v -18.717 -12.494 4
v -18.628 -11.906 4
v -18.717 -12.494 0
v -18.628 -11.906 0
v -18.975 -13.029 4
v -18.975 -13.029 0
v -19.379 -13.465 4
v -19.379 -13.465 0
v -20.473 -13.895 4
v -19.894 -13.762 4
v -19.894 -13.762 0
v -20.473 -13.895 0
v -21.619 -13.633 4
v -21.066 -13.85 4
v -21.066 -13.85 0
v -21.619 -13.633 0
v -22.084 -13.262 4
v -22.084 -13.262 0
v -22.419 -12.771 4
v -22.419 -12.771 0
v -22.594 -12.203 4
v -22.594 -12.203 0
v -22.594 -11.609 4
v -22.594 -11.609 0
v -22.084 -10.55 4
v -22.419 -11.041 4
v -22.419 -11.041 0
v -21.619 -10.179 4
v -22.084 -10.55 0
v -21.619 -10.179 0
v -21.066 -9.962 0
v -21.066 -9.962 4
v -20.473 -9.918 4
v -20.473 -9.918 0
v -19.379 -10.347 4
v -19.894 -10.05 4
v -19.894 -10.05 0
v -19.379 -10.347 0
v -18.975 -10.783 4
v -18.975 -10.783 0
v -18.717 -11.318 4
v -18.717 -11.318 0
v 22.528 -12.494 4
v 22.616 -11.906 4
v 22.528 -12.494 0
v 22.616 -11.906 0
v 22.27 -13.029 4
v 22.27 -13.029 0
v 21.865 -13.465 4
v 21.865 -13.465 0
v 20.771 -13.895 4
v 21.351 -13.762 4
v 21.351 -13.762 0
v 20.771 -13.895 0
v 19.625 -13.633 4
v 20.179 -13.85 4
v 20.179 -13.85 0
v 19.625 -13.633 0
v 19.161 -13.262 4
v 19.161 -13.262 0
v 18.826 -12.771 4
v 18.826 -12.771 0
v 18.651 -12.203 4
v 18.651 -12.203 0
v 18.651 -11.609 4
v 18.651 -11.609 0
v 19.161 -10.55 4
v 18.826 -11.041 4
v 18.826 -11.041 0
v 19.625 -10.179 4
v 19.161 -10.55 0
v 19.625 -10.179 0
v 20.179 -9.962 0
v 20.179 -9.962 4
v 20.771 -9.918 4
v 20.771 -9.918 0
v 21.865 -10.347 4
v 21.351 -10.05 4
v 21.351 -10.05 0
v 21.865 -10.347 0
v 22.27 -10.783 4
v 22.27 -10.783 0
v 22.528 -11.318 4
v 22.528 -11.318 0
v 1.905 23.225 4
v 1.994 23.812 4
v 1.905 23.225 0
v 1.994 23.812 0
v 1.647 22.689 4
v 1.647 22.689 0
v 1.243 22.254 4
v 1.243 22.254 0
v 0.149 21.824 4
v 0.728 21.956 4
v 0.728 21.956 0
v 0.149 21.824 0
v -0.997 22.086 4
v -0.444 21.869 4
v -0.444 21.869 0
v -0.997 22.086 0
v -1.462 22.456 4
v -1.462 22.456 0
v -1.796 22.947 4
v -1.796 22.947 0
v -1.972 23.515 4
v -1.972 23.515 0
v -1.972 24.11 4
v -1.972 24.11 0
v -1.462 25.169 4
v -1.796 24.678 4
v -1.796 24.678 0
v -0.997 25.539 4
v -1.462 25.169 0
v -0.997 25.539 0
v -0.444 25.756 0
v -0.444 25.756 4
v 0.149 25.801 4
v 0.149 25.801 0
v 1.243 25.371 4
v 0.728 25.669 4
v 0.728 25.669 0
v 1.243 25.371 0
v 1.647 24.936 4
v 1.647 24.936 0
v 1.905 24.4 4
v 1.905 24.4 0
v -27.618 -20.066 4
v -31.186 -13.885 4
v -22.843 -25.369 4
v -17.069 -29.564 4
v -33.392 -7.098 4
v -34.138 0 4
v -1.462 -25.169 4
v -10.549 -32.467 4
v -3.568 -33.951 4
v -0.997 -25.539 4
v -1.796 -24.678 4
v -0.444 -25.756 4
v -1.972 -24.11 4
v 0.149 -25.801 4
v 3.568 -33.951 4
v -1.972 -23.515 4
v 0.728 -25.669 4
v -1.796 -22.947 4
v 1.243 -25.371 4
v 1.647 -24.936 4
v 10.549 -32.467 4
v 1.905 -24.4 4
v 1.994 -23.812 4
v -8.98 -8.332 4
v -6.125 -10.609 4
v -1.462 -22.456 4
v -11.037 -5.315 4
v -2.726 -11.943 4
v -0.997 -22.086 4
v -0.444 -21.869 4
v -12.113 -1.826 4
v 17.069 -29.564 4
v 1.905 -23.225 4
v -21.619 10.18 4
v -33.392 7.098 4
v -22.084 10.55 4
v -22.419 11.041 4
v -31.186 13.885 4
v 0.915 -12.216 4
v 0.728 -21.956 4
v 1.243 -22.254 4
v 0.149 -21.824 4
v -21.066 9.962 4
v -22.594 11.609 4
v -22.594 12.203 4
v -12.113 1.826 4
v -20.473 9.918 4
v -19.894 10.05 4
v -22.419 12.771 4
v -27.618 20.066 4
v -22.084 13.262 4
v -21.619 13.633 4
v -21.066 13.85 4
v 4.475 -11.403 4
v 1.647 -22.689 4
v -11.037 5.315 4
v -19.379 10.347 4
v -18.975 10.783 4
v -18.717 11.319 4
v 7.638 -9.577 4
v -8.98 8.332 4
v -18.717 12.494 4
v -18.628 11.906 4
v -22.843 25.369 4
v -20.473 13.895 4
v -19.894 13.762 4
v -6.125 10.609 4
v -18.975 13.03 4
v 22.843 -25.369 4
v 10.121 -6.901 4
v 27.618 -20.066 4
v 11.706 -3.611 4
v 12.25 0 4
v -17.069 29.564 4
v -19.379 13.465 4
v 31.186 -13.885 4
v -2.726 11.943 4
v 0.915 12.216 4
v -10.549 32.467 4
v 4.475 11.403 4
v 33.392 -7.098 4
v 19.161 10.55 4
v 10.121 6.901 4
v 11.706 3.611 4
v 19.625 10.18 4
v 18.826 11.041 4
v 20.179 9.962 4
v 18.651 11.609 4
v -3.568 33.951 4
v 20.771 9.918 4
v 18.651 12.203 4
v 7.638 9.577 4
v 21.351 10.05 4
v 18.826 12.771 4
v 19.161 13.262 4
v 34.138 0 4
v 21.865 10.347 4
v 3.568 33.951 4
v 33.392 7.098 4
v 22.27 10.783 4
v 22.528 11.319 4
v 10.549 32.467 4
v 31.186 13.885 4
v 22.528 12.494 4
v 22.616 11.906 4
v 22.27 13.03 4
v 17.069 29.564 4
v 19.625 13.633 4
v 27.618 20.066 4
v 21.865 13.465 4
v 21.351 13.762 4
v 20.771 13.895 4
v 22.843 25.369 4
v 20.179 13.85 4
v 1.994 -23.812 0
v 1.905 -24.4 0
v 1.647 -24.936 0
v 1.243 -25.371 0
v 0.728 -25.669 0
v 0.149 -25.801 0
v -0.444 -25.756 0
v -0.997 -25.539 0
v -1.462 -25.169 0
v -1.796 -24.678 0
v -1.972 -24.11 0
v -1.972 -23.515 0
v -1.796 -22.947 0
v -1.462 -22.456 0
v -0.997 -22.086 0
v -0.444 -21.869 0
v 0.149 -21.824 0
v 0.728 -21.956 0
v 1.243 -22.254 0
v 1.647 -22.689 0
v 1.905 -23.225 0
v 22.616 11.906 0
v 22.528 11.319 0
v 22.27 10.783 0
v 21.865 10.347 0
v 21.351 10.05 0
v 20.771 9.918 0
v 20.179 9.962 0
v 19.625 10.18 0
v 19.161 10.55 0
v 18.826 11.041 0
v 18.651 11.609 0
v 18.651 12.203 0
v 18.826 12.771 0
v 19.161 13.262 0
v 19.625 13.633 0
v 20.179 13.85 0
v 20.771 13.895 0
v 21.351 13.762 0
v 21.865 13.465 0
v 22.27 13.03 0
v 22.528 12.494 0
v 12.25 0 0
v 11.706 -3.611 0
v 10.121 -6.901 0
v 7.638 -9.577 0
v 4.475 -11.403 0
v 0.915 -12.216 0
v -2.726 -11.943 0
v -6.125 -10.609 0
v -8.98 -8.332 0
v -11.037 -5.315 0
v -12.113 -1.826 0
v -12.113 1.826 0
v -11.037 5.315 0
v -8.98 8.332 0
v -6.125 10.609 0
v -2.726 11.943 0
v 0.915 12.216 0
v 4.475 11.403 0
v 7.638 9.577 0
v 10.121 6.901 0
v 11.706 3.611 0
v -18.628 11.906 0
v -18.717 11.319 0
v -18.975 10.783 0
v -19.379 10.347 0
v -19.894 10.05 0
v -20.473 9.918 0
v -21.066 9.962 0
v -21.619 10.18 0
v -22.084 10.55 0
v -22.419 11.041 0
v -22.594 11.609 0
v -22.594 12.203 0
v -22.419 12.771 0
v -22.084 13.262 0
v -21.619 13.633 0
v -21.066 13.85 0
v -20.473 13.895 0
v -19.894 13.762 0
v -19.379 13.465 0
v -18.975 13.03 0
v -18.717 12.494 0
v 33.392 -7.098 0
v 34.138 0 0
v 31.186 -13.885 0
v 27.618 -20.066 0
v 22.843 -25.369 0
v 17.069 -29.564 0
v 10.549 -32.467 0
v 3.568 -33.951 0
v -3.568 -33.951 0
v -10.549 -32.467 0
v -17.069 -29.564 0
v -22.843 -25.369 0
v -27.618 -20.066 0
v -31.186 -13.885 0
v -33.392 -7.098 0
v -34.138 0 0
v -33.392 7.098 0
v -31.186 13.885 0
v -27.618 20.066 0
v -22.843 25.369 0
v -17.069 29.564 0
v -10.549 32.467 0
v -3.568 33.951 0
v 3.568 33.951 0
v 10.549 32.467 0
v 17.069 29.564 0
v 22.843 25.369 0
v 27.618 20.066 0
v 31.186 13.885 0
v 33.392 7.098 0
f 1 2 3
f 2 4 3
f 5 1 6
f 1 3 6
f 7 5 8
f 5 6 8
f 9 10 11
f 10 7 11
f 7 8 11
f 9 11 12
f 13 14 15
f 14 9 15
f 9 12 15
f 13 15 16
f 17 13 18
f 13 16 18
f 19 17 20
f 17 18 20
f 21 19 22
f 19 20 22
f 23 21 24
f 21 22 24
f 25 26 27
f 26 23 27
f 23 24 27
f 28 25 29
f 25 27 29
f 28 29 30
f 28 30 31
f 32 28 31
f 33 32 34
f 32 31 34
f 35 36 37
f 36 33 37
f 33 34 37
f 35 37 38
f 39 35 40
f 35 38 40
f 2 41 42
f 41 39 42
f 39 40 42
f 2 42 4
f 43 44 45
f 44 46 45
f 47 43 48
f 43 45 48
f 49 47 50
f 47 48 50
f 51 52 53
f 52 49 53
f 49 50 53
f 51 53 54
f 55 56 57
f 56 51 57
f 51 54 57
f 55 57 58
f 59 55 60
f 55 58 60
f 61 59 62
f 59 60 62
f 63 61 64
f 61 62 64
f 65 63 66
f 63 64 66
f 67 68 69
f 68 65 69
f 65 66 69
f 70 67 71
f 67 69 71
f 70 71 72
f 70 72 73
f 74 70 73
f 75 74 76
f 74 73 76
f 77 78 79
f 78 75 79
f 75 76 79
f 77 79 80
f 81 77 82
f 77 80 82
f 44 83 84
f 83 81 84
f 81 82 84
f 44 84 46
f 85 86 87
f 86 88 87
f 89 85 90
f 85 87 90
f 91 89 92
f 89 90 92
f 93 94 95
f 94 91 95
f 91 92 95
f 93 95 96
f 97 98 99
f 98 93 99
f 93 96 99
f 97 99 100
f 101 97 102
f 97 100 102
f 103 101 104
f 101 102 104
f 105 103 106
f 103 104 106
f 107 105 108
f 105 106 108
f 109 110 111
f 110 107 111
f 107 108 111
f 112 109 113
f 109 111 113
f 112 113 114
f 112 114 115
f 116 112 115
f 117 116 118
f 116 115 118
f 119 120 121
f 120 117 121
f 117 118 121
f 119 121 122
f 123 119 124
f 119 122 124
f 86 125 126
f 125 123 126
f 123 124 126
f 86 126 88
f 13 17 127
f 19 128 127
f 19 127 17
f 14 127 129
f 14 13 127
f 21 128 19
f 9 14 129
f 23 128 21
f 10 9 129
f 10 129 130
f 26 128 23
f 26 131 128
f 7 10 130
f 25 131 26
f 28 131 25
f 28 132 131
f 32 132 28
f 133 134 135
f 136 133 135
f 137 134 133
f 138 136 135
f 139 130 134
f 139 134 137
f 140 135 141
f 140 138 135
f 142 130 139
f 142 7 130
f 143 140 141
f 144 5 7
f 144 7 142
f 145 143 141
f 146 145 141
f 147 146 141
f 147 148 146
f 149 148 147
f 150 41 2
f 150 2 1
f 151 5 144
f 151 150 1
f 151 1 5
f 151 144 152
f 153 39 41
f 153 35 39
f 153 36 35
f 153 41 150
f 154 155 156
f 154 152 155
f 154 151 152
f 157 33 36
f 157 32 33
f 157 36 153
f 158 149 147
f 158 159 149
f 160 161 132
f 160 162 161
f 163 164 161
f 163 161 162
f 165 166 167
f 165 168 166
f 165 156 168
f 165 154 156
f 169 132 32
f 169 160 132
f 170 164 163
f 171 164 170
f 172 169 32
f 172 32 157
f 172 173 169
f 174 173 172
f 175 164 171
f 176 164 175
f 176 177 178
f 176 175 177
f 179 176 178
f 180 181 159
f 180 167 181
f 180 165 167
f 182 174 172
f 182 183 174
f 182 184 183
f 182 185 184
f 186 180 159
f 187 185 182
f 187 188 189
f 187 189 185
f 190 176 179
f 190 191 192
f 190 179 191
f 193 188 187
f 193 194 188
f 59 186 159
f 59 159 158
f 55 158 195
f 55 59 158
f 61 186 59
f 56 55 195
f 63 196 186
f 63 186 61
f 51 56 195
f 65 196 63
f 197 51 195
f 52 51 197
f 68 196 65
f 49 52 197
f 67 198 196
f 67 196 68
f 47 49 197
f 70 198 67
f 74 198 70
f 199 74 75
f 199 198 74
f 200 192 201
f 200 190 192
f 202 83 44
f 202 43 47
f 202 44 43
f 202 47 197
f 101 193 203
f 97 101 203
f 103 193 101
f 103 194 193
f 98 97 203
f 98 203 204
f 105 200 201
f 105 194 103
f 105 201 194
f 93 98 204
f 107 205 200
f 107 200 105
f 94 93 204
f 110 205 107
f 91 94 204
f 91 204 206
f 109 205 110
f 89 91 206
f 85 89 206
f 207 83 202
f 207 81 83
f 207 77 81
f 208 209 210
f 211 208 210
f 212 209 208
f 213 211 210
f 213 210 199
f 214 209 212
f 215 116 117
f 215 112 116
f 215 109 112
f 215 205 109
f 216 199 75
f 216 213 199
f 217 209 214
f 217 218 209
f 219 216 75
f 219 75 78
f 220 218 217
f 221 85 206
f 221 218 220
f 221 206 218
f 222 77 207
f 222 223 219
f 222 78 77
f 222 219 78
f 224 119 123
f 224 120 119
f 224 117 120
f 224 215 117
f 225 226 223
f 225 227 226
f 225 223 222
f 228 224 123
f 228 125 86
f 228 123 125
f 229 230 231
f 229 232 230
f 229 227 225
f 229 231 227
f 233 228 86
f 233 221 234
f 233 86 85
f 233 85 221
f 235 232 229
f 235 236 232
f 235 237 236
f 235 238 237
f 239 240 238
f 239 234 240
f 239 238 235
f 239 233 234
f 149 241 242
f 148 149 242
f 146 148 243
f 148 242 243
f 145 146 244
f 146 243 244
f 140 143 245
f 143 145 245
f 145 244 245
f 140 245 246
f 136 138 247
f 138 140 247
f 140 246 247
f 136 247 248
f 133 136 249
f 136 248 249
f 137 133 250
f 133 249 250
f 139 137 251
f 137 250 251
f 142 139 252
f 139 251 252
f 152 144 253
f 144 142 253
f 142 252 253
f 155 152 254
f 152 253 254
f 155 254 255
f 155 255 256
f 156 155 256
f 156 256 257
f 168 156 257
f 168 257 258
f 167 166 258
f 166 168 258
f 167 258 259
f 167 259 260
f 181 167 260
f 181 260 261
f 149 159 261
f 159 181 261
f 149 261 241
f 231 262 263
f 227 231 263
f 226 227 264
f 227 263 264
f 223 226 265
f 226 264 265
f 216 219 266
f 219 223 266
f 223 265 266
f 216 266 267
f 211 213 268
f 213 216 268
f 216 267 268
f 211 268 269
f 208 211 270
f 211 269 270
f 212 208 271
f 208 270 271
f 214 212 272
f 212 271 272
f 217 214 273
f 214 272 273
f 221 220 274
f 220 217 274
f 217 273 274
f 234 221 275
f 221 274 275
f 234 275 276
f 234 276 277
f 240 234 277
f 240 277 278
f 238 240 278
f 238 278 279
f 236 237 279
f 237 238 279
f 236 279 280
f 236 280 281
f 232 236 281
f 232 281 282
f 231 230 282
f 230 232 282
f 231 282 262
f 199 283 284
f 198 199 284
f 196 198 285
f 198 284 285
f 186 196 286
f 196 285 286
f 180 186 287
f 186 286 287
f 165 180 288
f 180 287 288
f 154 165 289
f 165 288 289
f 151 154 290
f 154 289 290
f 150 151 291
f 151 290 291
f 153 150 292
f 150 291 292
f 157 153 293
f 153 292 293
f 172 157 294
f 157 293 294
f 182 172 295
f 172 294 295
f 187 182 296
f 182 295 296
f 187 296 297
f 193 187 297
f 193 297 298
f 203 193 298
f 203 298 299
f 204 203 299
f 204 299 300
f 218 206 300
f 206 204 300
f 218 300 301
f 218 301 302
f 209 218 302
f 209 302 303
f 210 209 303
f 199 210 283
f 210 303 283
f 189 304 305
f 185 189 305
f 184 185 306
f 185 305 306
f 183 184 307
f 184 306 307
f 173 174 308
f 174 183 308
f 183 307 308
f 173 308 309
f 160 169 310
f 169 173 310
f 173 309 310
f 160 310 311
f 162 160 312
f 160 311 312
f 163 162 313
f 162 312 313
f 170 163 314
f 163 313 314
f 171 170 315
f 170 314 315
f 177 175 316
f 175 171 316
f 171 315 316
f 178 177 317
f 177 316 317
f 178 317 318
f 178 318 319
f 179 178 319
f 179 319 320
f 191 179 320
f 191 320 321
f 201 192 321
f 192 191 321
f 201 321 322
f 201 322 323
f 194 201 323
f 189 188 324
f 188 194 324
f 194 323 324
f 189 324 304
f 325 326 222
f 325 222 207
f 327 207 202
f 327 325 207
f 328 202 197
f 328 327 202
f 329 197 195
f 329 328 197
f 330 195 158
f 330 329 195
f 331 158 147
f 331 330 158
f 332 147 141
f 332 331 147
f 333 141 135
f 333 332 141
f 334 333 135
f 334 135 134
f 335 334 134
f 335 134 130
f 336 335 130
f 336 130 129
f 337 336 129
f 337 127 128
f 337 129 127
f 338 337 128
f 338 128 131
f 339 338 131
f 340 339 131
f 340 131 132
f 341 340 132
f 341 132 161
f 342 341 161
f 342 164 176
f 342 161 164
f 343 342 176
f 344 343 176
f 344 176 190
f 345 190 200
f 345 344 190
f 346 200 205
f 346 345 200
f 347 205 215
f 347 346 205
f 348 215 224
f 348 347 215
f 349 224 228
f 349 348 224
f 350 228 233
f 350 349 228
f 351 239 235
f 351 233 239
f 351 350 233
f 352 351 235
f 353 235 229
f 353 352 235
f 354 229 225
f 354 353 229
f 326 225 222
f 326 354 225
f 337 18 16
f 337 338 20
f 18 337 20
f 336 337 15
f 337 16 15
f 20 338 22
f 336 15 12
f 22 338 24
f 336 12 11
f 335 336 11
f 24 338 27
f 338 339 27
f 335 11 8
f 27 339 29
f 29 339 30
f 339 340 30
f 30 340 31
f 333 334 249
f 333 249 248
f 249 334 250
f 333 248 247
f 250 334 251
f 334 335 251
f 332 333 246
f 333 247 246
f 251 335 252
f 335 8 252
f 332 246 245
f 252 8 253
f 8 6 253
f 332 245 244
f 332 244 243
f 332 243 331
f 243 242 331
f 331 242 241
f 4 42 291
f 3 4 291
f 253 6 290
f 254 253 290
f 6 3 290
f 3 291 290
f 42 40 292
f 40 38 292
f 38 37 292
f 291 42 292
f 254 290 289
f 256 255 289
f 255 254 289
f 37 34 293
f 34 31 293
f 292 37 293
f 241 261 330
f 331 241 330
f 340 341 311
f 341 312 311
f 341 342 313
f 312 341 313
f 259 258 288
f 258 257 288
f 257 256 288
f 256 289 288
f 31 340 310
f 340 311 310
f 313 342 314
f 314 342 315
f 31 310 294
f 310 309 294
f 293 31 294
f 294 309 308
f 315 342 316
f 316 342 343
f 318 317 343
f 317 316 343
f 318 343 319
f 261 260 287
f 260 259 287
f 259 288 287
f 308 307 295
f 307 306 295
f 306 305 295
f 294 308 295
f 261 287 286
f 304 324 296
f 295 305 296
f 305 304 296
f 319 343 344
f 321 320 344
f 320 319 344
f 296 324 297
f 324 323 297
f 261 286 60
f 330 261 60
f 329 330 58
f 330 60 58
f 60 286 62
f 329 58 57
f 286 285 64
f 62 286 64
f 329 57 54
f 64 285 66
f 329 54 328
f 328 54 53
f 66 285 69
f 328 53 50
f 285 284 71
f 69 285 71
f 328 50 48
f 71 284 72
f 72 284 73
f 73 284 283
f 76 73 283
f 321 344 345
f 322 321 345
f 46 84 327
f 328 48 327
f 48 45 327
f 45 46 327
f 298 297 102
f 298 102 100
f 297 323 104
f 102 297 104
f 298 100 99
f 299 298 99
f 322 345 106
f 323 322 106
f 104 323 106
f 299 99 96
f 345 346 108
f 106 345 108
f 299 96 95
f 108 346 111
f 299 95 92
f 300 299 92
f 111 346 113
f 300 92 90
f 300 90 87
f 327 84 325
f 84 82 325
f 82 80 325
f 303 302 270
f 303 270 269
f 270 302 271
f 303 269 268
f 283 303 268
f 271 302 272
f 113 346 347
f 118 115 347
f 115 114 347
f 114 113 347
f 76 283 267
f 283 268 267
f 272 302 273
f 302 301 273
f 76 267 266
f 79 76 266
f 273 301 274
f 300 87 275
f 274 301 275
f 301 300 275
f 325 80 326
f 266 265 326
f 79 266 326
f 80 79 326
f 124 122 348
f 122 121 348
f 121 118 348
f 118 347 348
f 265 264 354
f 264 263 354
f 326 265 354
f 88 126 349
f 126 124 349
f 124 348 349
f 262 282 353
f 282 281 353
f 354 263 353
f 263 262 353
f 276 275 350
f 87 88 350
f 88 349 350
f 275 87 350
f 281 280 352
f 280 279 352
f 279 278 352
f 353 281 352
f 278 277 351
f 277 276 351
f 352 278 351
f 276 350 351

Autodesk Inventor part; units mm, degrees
ref_plane "YZ Plane" through (0, 0, 0) normal (1, 0, 0) x (0, 1, 0)
ref_plane "XZ Plane" through (0, 0, 0) normal (0, 1, 0) x (-1, 0, 0)
ref_plane "XY Plane" through (0, 0, 0) normal (0, 0, 1) x (1, 0, 0)
sketch "Base" plane through (0, 0, 0) normal (0, 0, 1) x (1, 0, 0)
  circle A0 centre (0, 0) radius 34.1376
  circle A1 centre (0, 23.8125) radius 1.9939 projected
  circle A2 centre (20.6222, 11.9063) radius 1.9939 projected
  circle A3 centre (20.6222, -11.9062) radius 1.9939 projected
  circle A4 centre (0, -23.8125) radius 1.9939 projected
  circle A5 centre (-20.6222, -11.9062) radius 1.9939 projected
  circle A6 centre (-20.6222, 11.9063) radius 1.9939 projected
  circle A7 centre (0, 0) radius 12.25
  dimension "d2" = 68.2752
  dimension "d9" = 24.5
extrude "BaseFeature" add sketch "Base" along normal blind 4
equation "\"BendRadius\" = Thickness"
equation "\"BendReliefWidth\" = Thickness"
equation "\"BendReliefDepth\" = 0.5 * Thickness"
equation "\"CornerReliefSize\" = 4 * Thickness"
equation "\"MinimumRemnant\" = 2 * Thickness"
equation "\"TransitionRadius\" = BendRadius"
equation "\"JacobiRadiusSize\" = BendRadius"
equation "\"GapSize\" = Thickness"
equation "\"d6\" = Thickness"
equation "\"Thickness\" = 3.048"
properties part number "WheelSproketHub"
